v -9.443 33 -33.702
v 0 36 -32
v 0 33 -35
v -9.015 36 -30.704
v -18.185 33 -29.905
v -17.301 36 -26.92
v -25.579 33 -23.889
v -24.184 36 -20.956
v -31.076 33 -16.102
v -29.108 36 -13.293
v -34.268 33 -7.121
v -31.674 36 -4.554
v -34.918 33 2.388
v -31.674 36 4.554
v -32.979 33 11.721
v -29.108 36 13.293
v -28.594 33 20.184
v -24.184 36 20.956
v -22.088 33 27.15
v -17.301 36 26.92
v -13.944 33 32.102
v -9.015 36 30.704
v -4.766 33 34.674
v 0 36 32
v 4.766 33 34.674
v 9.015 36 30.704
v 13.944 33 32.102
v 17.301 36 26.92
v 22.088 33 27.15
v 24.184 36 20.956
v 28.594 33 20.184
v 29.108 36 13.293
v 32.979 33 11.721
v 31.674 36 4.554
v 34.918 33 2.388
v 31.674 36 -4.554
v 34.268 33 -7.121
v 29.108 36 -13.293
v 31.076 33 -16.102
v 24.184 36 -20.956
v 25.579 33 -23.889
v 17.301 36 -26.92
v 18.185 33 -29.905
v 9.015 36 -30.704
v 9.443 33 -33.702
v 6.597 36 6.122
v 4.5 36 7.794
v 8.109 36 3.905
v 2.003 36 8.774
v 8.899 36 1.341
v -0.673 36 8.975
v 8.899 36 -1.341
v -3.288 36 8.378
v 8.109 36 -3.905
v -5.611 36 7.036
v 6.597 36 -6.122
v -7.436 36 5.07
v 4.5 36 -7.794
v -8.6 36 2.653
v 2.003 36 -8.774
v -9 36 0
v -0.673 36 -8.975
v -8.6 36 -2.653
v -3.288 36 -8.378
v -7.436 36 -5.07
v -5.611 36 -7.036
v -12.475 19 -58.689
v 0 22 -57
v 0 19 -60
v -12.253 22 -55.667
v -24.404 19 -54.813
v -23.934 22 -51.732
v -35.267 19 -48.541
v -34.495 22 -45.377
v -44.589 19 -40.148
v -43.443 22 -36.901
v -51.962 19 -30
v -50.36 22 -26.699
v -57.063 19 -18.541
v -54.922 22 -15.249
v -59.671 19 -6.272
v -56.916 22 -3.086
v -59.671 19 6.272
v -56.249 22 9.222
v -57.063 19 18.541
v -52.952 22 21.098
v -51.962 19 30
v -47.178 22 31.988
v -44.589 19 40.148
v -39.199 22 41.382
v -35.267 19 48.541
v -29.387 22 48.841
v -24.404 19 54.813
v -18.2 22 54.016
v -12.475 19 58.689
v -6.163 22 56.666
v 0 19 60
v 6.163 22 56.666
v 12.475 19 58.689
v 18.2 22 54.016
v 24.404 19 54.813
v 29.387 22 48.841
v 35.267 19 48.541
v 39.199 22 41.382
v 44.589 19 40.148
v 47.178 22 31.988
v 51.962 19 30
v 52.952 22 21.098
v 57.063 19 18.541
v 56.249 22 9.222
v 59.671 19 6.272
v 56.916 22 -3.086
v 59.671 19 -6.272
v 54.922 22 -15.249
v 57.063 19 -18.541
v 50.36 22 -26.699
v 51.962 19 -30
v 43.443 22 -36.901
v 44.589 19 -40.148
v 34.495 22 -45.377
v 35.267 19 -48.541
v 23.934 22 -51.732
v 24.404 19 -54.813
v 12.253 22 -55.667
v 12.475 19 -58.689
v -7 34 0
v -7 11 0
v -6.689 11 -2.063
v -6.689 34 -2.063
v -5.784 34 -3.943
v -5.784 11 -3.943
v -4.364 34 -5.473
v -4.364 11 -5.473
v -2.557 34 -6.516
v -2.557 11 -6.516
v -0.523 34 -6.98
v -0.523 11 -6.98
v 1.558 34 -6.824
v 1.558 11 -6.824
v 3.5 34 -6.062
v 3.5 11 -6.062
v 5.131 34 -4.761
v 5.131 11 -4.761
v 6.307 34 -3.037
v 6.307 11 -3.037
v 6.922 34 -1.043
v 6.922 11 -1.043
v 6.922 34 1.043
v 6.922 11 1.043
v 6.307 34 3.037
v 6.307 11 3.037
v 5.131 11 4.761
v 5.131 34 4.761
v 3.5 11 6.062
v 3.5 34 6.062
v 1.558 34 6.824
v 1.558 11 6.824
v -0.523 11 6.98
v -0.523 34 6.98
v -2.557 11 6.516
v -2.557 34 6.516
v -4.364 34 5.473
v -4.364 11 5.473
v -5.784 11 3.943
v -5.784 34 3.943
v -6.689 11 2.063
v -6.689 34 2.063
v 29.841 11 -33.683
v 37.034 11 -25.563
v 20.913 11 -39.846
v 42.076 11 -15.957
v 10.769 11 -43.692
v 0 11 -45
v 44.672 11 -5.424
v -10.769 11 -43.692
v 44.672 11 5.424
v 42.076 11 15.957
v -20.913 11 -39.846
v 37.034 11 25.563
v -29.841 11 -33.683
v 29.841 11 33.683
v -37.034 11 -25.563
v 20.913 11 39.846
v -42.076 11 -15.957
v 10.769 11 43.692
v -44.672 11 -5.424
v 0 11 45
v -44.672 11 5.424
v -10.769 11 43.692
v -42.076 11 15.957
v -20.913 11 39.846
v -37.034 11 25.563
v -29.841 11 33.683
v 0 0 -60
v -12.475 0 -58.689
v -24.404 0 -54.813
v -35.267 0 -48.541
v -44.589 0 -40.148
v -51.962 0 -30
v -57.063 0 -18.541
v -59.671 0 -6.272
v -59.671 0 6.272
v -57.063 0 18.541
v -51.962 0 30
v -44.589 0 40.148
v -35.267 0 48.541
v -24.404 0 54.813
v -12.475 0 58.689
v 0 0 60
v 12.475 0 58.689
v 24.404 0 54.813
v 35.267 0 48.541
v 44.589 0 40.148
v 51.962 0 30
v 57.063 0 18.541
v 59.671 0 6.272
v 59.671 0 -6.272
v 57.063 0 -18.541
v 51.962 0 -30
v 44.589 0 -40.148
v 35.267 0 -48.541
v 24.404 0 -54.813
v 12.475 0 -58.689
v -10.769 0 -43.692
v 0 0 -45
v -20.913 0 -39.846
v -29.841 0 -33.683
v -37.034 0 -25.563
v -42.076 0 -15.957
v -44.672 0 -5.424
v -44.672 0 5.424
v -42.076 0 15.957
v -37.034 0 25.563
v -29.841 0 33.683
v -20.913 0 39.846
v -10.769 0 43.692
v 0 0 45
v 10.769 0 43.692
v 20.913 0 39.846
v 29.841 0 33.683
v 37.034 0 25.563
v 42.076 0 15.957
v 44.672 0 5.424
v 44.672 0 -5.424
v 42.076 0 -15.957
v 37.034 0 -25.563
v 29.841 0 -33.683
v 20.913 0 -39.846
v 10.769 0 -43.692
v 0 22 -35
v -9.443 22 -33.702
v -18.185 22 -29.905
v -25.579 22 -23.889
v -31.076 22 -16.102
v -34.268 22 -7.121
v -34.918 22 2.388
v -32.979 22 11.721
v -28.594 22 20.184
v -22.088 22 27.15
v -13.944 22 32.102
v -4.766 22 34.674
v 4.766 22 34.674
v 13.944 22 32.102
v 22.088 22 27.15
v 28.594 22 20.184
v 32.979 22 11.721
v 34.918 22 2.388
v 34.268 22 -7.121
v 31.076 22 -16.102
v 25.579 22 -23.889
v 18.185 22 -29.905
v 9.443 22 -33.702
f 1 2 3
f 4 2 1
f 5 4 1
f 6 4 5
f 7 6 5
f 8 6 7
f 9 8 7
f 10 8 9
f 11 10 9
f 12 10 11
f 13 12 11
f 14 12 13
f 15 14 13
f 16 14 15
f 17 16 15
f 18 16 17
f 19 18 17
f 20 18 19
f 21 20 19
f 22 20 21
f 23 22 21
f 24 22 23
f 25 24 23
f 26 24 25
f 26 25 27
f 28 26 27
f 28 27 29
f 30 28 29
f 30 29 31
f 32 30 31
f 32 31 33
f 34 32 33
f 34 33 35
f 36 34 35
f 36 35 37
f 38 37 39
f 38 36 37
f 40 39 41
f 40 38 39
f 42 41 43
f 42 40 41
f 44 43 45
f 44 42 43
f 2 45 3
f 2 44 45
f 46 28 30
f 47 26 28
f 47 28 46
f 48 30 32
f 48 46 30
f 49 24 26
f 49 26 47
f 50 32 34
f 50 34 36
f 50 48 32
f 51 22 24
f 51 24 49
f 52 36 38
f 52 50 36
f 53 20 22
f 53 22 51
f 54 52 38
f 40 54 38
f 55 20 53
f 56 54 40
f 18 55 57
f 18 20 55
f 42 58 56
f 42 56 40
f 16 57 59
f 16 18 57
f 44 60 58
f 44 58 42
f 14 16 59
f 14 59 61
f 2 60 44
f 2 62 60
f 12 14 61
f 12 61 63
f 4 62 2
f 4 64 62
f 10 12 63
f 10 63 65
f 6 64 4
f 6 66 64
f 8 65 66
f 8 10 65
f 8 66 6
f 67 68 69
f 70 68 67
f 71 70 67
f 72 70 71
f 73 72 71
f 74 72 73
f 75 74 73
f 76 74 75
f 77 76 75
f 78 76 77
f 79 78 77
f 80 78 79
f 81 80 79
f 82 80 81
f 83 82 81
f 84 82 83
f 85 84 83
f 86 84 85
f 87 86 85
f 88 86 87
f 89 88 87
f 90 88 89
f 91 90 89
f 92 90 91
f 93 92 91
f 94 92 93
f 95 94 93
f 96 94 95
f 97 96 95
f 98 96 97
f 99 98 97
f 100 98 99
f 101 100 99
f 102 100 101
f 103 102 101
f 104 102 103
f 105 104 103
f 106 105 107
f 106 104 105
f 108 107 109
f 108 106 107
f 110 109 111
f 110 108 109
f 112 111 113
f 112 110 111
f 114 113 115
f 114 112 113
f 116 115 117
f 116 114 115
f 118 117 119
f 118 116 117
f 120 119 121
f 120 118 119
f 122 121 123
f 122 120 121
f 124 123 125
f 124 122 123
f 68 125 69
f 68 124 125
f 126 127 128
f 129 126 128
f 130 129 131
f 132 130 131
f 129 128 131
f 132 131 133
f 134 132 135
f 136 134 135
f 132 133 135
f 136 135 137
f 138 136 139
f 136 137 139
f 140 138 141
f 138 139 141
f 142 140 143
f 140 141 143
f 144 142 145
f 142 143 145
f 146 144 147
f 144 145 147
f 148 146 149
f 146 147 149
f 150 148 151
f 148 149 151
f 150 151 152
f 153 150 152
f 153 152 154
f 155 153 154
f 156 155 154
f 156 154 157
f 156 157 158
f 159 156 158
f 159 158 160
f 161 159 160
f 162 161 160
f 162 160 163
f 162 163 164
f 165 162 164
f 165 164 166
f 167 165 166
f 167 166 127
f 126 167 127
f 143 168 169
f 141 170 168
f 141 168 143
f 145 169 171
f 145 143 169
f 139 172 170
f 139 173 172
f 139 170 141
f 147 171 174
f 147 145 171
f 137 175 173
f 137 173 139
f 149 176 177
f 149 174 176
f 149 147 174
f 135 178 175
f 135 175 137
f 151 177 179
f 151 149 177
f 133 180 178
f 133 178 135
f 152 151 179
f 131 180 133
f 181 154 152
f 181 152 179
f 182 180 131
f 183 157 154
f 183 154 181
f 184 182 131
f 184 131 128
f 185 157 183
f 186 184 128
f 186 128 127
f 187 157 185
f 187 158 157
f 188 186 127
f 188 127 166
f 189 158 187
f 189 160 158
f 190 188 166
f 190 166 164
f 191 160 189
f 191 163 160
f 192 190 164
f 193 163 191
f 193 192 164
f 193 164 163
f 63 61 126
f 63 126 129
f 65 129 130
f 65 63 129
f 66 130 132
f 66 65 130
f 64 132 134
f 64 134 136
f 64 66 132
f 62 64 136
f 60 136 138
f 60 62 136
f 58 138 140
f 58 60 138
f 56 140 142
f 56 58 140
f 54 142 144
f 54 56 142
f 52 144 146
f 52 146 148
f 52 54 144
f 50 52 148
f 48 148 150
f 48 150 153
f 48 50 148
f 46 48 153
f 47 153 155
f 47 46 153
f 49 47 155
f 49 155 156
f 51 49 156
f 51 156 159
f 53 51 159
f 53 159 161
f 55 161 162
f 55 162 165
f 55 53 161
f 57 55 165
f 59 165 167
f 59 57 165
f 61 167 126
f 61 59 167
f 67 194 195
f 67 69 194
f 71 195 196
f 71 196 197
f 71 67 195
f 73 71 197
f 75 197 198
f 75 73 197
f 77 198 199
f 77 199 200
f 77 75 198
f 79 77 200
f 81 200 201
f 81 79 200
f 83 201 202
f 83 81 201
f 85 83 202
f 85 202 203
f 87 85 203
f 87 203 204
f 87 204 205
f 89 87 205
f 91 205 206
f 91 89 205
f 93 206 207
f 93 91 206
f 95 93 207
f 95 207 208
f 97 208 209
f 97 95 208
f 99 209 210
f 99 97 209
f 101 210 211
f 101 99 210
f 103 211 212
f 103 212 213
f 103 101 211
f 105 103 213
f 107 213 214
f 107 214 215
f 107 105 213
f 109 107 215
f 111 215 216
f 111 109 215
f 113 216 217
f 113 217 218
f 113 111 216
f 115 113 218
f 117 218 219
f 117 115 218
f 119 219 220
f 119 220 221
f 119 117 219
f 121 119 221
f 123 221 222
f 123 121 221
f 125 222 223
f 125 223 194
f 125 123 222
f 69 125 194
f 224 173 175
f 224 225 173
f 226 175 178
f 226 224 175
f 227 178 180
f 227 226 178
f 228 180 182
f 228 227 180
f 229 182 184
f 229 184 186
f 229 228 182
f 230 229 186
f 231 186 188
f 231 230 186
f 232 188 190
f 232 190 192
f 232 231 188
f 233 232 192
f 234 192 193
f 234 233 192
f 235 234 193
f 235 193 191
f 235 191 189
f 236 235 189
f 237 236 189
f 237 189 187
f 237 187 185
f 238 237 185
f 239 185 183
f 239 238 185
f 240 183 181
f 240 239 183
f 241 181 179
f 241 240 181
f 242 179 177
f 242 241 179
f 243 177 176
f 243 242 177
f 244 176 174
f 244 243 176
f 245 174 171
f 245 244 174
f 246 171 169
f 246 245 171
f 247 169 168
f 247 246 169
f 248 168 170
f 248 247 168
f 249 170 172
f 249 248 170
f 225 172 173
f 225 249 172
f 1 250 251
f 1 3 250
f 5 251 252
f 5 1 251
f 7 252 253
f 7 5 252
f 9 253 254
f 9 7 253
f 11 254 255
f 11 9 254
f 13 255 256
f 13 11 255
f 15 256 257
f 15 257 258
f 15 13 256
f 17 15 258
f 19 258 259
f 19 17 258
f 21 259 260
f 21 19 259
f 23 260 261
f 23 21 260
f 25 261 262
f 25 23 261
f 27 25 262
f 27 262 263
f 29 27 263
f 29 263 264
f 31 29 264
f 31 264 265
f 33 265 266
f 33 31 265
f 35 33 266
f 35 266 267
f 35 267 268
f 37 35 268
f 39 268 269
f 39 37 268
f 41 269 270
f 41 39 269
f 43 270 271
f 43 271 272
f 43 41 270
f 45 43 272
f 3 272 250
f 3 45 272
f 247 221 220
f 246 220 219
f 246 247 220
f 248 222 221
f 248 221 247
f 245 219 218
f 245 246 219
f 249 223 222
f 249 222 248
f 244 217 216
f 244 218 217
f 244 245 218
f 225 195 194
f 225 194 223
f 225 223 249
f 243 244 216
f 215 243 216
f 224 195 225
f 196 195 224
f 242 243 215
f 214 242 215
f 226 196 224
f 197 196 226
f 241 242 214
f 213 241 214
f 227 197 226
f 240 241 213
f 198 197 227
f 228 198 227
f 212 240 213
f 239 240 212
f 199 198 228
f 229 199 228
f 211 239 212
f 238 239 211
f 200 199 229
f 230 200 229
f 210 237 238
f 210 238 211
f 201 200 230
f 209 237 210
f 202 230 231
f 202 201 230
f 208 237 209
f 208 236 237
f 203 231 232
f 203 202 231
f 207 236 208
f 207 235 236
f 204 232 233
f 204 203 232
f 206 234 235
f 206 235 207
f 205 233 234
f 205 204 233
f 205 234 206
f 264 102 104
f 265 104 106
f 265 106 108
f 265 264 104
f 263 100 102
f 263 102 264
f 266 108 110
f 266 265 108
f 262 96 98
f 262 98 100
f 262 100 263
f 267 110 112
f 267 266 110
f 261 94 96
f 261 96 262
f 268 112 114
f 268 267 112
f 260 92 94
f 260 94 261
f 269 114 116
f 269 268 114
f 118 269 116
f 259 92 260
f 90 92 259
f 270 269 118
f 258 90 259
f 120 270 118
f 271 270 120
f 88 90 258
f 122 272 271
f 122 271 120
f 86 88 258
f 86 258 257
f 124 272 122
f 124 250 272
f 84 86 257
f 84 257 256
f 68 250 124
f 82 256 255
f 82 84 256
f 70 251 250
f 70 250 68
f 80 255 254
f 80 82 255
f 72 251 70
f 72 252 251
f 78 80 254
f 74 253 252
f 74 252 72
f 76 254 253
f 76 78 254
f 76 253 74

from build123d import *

# Parameters (mm, degrees)
M16_TAPPED_HOLE1_D     = 14
M16_TAPPED_HOLE1_DEPTH = 42
CHAMFER1_SIZE          = 2


with BuildPart() as part:
    # Sketch1 → Revolve1 (revolve)
    with BuildSketch(Plane.XY, mode=Mode.PRIVATE) as revolve1_sk:
        Polygon((0, 36), (0, 11), (45, 11), (45, 0), (60, 0), (60, 19), (57, 22), (35, 22), (35, 33), (32, 36), align=None)
    revolve(revolve1_sk.sketch.rotate(Axis((0, 0, 0), (0, 1, 0)), 90), axis=Axis((0, 0, 0), (0, 1, 0)))

    # M16 Tapped Hole1
    with Locations(Plane(origin=(0, 36, 0), x_dir=(1, 0, 0), z_dir=(0, 1, 0))):
        with Locations((0, 0)):
            Hole(M16_TAPPED_HOLE1_D / 2, depth=M16_TAPPED_HOLE1_DEPTH)

    # Chamfer1
    chamfer1_edges = [part.edges().sort_by_distance(p)[0] for p in [
        (7, 36, 0),
    ]]
    chamfer(chamfer1_edges, length=CHAMFER1_SIZE)


solid = part.part
